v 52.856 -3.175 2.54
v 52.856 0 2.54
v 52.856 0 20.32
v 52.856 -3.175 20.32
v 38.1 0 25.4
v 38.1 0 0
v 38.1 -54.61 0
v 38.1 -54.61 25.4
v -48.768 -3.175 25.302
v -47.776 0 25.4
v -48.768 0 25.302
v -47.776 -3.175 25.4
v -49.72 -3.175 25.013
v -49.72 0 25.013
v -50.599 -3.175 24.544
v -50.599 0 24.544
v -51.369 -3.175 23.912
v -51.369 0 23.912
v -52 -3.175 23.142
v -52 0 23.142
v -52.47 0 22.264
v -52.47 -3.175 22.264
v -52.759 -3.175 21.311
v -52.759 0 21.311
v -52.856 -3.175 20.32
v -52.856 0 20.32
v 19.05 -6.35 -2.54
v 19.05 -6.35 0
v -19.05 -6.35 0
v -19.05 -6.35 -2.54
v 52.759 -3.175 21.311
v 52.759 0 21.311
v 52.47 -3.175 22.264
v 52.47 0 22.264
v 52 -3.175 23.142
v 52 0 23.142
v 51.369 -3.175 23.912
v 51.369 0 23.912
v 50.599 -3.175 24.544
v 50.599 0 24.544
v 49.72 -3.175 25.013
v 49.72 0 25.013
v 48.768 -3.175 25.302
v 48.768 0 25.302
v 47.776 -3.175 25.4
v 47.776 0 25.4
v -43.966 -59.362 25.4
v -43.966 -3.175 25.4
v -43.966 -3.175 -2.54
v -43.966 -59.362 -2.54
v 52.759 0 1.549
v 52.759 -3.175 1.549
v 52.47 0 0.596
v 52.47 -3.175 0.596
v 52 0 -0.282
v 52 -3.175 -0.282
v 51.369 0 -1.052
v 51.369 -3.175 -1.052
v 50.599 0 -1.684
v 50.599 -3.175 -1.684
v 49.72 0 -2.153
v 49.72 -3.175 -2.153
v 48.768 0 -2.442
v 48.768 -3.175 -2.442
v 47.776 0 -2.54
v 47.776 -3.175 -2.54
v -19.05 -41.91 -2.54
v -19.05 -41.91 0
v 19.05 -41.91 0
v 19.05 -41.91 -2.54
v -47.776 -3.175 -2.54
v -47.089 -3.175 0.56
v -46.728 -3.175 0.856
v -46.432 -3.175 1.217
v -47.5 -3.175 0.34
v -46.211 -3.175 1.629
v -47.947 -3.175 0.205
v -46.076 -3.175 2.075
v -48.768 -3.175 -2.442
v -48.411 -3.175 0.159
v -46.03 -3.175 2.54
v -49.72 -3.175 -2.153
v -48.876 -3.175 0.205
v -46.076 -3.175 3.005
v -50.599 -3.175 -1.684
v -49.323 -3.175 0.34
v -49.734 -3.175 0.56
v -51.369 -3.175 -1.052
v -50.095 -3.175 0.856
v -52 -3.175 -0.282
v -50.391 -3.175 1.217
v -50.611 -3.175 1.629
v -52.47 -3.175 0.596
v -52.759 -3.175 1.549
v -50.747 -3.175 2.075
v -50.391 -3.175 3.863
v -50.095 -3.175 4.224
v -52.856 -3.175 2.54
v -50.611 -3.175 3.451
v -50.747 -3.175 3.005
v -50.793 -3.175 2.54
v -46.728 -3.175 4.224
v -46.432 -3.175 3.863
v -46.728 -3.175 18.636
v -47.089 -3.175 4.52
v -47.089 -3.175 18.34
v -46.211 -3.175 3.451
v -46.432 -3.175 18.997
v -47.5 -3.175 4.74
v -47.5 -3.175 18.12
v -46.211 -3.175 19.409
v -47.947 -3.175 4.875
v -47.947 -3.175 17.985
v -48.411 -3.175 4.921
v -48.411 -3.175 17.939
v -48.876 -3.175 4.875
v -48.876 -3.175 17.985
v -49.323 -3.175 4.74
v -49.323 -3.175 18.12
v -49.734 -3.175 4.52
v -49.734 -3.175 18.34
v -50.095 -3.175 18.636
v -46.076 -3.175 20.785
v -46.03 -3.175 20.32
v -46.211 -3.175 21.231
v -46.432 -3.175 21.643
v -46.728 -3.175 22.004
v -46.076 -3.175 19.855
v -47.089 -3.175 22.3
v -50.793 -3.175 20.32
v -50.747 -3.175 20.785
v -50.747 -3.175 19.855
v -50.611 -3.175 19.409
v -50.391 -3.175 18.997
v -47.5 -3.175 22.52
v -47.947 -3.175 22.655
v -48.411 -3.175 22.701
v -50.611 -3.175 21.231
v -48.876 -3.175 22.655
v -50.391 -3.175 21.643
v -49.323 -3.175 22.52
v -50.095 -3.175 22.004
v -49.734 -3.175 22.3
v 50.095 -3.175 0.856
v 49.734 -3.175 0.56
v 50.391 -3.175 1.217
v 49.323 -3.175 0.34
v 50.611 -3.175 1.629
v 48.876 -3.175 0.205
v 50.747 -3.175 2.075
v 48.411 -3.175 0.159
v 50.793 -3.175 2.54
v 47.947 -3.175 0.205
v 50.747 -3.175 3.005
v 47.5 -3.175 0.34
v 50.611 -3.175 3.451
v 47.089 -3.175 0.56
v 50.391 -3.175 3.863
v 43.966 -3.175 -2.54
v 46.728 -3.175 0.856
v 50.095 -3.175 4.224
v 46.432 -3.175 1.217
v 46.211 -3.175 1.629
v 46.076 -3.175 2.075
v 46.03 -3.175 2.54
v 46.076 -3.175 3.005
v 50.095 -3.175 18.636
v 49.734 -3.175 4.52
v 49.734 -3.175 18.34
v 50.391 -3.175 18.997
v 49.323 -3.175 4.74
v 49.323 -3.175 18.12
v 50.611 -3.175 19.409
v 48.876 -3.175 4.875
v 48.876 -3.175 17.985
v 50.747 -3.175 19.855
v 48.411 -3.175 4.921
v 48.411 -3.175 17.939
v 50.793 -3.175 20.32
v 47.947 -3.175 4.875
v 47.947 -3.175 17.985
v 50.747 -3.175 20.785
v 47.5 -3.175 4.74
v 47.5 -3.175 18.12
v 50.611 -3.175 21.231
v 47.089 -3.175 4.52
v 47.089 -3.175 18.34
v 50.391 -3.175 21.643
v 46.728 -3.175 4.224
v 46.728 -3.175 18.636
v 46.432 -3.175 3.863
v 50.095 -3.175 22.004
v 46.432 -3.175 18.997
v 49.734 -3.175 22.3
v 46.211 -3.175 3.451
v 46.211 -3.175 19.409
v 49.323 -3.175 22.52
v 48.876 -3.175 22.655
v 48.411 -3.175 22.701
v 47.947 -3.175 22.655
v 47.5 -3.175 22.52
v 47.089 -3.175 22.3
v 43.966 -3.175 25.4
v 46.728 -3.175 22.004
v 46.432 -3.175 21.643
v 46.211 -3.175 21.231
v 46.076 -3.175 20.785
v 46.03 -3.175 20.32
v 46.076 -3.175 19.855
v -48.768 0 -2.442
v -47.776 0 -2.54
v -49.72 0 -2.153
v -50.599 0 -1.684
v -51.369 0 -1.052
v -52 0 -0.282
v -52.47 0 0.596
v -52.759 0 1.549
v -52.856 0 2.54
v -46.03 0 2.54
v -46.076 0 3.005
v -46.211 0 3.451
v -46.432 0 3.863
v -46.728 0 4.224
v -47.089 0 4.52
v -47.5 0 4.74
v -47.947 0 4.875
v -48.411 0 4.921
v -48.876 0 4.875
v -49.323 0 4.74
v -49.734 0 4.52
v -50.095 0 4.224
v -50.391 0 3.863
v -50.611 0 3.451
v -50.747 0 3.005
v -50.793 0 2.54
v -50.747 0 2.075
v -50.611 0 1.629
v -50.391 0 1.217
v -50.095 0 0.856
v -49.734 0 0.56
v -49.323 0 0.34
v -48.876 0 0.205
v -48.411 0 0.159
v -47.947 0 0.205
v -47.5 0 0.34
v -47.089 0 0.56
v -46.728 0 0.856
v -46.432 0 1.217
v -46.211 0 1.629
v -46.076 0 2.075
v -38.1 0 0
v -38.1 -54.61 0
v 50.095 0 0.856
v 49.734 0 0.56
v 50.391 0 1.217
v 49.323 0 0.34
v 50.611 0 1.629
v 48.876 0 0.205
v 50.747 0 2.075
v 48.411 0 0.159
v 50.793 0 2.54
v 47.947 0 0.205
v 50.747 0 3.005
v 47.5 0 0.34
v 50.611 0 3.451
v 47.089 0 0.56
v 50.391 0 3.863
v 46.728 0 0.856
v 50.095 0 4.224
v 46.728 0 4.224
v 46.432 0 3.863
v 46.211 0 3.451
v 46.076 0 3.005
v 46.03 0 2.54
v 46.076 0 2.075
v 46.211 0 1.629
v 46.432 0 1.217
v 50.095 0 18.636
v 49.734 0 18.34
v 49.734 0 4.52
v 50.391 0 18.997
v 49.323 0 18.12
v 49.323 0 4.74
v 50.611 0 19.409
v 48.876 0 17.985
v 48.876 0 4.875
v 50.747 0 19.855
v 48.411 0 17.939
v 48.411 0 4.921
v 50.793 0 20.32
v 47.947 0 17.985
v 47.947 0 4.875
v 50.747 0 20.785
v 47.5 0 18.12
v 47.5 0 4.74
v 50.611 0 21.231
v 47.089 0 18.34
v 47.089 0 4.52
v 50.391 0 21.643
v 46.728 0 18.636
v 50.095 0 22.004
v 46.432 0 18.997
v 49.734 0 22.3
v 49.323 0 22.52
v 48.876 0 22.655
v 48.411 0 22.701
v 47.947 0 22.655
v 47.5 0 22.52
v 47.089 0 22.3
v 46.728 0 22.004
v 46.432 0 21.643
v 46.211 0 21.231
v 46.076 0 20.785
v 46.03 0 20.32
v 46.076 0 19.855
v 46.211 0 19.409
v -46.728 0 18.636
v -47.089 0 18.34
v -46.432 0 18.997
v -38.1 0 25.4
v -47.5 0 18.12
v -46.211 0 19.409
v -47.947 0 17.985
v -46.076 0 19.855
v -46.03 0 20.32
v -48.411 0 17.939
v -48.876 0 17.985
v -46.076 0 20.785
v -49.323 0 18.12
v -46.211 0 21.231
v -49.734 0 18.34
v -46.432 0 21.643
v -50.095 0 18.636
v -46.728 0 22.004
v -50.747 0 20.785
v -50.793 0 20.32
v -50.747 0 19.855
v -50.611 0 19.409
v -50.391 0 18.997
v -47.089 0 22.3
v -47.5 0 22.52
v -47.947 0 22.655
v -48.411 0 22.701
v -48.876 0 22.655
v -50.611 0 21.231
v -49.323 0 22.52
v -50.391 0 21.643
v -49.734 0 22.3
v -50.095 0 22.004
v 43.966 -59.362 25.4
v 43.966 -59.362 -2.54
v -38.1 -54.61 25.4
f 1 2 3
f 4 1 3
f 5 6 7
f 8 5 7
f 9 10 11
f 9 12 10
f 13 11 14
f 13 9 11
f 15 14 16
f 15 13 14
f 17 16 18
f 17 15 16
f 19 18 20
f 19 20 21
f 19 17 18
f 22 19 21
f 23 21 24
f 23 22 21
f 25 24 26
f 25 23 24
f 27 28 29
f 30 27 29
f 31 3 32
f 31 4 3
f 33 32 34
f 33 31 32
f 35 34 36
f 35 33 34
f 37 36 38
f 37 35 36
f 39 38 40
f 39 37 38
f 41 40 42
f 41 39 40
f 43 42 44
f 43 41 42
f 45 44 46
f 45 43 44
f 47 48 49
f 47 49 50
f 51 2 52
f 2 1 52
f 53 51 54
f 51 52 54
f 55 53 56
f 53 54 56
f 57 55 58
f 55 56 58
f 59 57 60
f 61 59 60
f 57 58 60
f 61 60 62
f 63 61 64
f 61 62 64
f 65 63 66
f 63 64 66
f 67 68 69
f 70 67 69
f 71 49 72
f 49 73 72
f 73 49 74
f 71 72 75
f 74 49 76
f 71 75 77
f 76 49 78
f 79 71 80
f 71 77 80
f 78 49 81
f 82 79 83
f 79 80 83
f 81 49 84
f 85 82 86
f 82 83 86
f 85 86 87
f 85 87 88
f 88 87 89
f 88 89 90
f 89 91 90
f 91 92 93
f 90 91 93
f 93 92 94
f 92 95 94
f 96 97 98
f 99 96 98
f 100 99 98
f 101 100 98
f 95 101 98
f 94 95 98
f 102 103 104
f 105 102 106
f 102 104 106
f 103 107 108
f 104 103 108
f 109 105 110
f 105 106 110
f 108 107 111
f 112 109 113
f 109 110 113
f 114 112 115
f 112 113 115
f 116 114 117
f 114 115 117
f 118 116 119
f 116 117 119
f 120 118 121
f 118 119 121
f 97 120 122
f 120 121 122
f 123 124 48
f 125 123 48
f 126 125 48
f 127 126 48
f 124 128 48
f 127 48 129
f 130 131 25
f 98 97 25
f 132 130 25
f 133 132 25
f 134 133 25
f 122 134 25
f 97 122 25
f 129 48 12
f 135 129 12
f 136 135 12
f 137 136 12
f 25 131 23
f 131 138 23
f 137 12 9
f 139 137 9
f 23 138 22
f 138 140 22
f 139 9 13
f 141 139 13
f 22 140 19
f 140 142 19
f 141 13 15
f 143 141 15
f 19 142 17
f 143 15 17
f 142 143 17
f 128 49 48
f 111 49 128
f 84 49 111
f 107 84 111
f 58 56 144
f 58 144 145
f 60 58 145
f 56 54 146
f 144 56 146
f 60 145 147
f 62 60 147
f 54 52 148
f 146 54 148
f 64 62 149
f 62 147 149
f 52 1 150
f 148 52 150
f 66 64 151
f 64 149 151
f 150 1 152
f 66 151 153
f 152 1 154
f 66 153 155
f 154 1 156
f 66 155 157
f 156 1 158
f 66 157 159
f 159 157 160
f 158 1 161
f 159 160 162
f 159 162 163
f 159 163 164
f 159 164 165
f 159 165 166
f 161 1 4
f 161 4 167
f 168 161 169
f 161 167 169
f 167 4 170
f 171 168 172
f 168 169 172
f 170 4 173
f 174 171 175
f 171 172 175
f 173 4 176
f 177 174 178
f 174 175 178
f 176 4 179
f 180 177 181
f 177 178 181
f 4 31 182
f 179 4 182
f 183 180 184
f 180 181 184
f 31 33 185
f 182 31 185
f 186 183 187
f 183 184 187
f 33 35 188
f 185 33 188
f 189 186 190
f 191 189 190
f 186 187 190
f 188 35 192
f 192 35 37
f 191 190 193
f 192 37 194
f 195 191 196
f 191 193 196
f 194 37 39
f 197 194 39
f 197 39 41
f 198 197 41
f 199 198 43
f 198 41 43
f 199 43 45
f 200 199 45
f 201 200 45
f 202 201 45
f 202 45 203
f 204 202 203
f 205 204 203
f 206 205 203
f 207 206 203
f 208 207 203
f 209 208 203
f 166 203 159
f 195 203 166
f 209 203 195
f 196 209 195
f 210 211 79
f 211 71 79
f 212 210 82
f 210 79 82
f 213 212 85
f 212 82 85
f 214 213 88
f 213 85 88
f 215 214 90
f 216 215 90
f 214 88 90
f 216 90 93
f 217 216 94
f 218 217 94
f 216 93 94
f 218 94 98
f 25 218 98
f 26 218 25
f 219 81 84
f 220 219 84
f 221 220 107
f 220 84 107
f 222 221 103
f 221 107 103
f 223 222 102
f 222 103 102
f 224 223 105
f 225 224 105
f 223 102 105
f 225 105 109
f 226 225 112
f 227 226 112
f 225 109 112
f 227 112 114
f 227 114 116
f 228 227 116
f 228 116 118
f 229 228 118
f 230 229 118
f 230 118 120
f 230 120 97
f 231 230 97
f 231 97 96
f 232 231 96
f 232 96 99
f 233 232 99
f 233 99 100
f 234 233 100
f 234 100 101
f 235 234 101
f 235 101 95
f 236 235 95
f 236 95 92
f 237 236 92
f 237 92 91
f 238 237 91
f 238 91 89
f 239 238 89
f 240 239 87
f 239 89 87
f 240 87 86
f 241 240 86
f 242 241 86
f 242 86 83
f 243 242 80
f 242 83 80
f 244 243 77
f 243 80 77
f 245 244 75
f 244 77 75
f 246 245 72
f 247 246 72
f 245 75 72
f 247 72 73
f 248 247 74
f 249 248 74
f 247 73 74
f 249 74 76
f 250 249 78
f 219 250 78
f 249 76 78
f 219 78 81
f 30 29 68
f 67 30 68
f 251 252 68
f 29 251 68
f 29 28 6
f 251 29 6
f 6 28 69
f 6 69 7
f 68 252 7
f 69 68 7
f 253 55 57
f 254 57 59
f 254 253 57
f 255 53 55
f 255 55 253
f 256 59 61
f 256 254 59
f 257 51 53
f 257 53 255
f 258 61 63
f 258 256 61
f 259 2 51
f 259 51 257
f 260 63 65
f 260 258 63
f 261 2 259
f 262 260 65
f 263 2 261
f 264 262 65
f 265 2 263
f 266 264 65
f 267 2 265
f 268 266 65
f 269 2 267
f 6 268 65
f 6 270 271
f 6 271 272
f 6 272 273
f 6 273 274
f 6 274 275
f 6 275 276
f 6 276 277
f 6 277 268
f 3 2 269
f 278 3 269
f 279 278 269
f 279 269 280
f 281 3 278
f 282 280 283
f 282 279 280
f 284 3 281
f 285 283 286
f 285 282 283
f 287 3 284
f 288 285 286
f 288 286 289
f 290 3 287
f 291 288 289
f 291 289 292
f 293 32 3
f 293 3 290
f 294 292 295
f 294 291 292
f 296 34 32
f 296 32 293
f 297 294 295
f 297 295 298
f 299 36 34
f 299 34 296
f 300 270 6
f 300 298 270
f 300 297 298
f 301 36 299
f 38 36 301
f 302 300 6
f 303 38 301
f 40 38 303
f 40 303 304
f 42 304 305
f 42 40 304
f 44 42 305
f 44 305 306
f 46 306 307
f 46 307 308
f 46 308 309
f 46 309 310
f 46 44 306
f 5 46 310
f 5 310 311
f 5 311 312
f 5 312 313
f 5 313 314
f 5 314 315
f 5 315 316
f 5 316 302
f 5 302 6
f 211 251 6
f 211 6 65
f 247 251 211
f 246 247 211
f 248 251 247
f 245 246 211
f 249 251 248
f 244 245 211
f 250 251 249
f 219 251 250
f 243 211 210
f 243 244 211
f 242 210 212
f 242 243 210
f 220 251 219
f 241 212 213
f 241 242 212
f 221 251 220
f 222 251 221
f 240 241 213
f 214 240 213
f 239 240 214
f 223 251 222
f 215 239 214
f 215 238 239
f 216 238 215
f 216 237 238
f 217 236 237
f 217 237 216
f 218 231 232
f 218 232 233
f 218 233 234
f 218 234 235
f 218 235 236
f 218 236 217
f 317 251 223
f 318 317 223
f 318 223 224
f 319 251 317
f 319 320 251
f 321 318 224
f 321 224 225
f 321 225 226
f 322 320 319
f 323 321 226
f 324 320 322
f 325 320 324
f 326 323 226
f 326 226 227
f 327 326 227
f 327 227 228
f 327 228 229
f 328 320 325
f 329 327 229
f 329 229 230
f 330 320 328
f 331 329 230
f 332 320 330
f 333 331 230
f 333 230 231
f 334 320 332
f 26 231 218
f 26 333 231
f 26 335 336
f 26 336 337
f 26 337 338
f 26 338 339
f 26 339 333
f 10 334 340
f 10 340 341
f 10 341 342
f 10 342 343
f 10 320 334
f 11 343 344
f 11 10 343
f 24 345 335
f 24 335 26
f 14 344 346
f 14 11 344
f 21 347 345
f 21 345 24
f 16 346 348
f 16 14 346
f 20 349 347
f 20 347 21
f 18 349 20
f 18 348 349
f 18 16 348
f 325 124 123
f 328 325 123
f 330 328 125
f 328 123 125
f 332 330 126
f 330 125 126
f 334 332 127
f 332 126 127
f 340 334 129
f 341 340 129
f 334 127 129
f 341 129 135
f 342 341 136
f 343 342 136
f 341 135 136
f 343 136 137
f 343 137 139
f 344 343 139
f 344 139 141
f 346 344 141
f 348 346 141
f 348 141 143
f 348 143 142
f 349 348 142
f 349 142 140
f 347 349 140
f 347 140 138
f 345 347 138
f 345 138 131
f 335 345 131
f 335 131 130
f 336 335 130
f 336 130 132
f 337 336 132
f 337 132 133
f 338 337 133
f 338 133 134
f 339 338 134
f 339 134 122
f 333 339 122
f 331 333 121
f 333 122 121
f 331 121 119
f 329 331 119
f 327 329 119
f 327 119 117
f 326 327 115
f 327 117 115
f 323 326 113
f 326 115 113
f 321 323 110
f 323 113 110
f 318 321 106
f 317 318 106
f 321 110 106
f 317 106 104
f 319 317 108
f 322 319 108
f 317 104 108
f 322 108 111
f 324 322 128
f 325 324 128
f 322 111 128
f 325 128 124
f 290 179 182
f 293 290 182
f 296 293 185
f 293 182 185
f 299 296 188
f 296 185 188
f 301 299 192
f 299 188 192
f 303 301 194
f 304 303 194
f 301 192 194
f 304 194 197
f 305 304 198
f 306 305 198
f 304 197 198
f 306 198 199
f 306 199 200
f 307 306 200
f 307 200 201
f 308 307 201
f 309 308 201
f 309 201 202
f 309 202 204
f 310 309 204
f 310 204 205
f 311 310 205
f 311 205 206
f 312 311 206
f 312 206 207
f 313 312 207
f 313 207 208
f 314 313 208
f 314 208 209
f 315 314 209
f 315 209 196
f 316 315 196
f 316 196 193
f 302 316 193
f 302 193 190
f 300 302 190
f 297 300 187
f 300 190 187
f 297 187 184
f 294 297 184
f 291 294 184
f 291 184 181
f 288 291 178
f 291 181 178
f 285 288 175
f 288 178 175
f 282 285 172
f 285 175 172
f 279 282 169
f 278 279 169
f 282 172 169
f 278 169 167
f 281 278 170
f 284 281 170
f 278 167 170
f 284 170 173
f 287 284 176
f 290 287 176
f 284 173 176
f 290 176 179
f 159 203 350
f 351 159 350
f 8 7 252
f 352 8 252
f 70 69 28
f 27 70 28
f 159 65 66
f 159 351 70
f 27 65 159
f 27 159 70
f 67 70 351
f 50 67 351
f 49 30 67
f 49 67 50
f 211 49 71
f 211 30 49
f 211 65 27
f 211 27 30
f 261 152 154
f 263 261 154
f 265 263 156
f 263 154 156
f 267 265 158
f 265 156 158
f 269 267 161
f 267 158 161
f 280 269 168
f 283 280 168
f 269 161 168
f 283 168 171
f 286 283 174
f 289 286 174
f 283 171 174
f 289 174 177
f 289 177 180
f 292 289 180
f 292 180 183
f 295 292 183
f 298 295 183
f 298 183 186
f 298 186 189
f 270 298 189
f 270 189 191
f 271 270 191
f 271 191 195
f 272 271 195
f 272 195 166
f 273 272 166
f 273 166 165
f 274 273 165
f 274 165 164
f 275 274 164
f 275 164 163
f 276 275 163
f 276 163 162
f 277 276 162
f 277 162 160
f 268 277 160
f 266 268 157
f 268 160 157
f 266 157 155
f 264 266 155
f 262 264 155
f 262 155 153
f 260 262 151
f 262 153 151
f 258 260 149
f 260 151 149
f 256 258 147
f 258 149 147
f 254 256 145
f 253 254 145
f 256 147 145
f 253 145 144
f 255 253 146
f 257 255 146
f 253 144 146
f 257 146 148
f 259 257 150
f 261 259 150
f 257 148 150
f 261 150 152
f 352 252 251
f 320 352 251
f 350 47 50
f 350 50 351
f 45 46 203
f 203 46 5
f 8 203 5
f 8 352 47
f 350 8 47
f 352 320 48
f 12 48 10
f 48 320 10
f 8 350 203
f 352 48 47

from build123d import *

# Parameters (mm, degrees)
F1_DEPTH  = 25.4
F2_W      = 87.9329293966
F2_H      = 59.3619965534
F3_DEPTH  = 2.54
F4_W      = 8.89
F4_H      = 27.94
F5_DEPTH  = 3.175
F7_DEPTH  = 2.541
F8_R      = 5.08
F9_R      = 2.38125
F10_DEPTH = 3.176


# Not quite as in the source:
# - a feature names something its author has since deleted; it is built from what else it names


with BuildPart() as f1:
    # F0 (on Top) → F1 (new body)
    with BuildSketch(Plane.XY):
        Polygon((38.1, -54.61), (-38.1, -54.61), (-38.1, 0), (-43.9664646983, 0), (-43.9664646983, -59.3619965534), (43.9664646983, -59.3619965534), (43.9664646983, 0), (38.1, 0), align=None)
    extrude(amount=F1_DEPTH)

    # F2 (on face) → F3 (join)
    with BuildSketch(Plane(origin=(0, 0, 0), x_dir=(1, 0, 0), z_dir=(0, 0, -1))):
        with Locations((0, 29.6809982767)):
            Rectangle(F2_W, F2_H)
    extrude(amount=F3_DEPTH)

    # F4 (on face) → F5 (join)
    with BuildSketch(Plane(origin=(0, 0, 0), x_dir=(-1, 0, 0), z_dir=(0, 1, 0))):
        with Locations((-48.4114646983, 11.43)):
            Rectangle(F4_W, F4_H)
        with Locations((48.4114646983, 11.43)):
            Rectangle(F4_W, F4_H)
    extrude(amount=-F5_DEPTH)

    # F6 (on face) → F7 (cut, through all)
    with BuildSketch(Plane.XY):
        Polygon((0, -6.35), (-19.05, -6.35), (-19.05, -41.91), (0, -41.91), (19.05, -41.91), (19.05, -6.35), align=None)
    extrude(amount=-F7_DEPTH, mode=Mode.SUBTRACT)

    # F8
    f8_edges = [f1.edges().sort_by_distance(p)[0] for p in [
        (52.856465, -1.5875, 25.4),
        (-52.856465, -1.5875, 25.4),
        (-52.856465, -1.5875, -2.54),
        (52.856465, -1.5875, -2.54),
    ]]
    fillet(f8_edges, radius=F8_R)

    # F9 (on face) → F10 (cut, through all)
    with BuildSketch(Plane.XZ.offset(3.175)):
        with Locations((48.4114646983, 20.32)):
            Circle(F9_R)
        with Locations((48.4114646983, 2.54)):
            Circle(F9_R)
        with Locations((-48.4114646983, 2.54)):
            Circle(F9_R)
        with Locations((-48.4114646983, 20.32)):
            Circle(F9_R)
    extrude(amount=-F10_DEPTH, mode=Mode.SUBTRACT)


solid = f1.part
